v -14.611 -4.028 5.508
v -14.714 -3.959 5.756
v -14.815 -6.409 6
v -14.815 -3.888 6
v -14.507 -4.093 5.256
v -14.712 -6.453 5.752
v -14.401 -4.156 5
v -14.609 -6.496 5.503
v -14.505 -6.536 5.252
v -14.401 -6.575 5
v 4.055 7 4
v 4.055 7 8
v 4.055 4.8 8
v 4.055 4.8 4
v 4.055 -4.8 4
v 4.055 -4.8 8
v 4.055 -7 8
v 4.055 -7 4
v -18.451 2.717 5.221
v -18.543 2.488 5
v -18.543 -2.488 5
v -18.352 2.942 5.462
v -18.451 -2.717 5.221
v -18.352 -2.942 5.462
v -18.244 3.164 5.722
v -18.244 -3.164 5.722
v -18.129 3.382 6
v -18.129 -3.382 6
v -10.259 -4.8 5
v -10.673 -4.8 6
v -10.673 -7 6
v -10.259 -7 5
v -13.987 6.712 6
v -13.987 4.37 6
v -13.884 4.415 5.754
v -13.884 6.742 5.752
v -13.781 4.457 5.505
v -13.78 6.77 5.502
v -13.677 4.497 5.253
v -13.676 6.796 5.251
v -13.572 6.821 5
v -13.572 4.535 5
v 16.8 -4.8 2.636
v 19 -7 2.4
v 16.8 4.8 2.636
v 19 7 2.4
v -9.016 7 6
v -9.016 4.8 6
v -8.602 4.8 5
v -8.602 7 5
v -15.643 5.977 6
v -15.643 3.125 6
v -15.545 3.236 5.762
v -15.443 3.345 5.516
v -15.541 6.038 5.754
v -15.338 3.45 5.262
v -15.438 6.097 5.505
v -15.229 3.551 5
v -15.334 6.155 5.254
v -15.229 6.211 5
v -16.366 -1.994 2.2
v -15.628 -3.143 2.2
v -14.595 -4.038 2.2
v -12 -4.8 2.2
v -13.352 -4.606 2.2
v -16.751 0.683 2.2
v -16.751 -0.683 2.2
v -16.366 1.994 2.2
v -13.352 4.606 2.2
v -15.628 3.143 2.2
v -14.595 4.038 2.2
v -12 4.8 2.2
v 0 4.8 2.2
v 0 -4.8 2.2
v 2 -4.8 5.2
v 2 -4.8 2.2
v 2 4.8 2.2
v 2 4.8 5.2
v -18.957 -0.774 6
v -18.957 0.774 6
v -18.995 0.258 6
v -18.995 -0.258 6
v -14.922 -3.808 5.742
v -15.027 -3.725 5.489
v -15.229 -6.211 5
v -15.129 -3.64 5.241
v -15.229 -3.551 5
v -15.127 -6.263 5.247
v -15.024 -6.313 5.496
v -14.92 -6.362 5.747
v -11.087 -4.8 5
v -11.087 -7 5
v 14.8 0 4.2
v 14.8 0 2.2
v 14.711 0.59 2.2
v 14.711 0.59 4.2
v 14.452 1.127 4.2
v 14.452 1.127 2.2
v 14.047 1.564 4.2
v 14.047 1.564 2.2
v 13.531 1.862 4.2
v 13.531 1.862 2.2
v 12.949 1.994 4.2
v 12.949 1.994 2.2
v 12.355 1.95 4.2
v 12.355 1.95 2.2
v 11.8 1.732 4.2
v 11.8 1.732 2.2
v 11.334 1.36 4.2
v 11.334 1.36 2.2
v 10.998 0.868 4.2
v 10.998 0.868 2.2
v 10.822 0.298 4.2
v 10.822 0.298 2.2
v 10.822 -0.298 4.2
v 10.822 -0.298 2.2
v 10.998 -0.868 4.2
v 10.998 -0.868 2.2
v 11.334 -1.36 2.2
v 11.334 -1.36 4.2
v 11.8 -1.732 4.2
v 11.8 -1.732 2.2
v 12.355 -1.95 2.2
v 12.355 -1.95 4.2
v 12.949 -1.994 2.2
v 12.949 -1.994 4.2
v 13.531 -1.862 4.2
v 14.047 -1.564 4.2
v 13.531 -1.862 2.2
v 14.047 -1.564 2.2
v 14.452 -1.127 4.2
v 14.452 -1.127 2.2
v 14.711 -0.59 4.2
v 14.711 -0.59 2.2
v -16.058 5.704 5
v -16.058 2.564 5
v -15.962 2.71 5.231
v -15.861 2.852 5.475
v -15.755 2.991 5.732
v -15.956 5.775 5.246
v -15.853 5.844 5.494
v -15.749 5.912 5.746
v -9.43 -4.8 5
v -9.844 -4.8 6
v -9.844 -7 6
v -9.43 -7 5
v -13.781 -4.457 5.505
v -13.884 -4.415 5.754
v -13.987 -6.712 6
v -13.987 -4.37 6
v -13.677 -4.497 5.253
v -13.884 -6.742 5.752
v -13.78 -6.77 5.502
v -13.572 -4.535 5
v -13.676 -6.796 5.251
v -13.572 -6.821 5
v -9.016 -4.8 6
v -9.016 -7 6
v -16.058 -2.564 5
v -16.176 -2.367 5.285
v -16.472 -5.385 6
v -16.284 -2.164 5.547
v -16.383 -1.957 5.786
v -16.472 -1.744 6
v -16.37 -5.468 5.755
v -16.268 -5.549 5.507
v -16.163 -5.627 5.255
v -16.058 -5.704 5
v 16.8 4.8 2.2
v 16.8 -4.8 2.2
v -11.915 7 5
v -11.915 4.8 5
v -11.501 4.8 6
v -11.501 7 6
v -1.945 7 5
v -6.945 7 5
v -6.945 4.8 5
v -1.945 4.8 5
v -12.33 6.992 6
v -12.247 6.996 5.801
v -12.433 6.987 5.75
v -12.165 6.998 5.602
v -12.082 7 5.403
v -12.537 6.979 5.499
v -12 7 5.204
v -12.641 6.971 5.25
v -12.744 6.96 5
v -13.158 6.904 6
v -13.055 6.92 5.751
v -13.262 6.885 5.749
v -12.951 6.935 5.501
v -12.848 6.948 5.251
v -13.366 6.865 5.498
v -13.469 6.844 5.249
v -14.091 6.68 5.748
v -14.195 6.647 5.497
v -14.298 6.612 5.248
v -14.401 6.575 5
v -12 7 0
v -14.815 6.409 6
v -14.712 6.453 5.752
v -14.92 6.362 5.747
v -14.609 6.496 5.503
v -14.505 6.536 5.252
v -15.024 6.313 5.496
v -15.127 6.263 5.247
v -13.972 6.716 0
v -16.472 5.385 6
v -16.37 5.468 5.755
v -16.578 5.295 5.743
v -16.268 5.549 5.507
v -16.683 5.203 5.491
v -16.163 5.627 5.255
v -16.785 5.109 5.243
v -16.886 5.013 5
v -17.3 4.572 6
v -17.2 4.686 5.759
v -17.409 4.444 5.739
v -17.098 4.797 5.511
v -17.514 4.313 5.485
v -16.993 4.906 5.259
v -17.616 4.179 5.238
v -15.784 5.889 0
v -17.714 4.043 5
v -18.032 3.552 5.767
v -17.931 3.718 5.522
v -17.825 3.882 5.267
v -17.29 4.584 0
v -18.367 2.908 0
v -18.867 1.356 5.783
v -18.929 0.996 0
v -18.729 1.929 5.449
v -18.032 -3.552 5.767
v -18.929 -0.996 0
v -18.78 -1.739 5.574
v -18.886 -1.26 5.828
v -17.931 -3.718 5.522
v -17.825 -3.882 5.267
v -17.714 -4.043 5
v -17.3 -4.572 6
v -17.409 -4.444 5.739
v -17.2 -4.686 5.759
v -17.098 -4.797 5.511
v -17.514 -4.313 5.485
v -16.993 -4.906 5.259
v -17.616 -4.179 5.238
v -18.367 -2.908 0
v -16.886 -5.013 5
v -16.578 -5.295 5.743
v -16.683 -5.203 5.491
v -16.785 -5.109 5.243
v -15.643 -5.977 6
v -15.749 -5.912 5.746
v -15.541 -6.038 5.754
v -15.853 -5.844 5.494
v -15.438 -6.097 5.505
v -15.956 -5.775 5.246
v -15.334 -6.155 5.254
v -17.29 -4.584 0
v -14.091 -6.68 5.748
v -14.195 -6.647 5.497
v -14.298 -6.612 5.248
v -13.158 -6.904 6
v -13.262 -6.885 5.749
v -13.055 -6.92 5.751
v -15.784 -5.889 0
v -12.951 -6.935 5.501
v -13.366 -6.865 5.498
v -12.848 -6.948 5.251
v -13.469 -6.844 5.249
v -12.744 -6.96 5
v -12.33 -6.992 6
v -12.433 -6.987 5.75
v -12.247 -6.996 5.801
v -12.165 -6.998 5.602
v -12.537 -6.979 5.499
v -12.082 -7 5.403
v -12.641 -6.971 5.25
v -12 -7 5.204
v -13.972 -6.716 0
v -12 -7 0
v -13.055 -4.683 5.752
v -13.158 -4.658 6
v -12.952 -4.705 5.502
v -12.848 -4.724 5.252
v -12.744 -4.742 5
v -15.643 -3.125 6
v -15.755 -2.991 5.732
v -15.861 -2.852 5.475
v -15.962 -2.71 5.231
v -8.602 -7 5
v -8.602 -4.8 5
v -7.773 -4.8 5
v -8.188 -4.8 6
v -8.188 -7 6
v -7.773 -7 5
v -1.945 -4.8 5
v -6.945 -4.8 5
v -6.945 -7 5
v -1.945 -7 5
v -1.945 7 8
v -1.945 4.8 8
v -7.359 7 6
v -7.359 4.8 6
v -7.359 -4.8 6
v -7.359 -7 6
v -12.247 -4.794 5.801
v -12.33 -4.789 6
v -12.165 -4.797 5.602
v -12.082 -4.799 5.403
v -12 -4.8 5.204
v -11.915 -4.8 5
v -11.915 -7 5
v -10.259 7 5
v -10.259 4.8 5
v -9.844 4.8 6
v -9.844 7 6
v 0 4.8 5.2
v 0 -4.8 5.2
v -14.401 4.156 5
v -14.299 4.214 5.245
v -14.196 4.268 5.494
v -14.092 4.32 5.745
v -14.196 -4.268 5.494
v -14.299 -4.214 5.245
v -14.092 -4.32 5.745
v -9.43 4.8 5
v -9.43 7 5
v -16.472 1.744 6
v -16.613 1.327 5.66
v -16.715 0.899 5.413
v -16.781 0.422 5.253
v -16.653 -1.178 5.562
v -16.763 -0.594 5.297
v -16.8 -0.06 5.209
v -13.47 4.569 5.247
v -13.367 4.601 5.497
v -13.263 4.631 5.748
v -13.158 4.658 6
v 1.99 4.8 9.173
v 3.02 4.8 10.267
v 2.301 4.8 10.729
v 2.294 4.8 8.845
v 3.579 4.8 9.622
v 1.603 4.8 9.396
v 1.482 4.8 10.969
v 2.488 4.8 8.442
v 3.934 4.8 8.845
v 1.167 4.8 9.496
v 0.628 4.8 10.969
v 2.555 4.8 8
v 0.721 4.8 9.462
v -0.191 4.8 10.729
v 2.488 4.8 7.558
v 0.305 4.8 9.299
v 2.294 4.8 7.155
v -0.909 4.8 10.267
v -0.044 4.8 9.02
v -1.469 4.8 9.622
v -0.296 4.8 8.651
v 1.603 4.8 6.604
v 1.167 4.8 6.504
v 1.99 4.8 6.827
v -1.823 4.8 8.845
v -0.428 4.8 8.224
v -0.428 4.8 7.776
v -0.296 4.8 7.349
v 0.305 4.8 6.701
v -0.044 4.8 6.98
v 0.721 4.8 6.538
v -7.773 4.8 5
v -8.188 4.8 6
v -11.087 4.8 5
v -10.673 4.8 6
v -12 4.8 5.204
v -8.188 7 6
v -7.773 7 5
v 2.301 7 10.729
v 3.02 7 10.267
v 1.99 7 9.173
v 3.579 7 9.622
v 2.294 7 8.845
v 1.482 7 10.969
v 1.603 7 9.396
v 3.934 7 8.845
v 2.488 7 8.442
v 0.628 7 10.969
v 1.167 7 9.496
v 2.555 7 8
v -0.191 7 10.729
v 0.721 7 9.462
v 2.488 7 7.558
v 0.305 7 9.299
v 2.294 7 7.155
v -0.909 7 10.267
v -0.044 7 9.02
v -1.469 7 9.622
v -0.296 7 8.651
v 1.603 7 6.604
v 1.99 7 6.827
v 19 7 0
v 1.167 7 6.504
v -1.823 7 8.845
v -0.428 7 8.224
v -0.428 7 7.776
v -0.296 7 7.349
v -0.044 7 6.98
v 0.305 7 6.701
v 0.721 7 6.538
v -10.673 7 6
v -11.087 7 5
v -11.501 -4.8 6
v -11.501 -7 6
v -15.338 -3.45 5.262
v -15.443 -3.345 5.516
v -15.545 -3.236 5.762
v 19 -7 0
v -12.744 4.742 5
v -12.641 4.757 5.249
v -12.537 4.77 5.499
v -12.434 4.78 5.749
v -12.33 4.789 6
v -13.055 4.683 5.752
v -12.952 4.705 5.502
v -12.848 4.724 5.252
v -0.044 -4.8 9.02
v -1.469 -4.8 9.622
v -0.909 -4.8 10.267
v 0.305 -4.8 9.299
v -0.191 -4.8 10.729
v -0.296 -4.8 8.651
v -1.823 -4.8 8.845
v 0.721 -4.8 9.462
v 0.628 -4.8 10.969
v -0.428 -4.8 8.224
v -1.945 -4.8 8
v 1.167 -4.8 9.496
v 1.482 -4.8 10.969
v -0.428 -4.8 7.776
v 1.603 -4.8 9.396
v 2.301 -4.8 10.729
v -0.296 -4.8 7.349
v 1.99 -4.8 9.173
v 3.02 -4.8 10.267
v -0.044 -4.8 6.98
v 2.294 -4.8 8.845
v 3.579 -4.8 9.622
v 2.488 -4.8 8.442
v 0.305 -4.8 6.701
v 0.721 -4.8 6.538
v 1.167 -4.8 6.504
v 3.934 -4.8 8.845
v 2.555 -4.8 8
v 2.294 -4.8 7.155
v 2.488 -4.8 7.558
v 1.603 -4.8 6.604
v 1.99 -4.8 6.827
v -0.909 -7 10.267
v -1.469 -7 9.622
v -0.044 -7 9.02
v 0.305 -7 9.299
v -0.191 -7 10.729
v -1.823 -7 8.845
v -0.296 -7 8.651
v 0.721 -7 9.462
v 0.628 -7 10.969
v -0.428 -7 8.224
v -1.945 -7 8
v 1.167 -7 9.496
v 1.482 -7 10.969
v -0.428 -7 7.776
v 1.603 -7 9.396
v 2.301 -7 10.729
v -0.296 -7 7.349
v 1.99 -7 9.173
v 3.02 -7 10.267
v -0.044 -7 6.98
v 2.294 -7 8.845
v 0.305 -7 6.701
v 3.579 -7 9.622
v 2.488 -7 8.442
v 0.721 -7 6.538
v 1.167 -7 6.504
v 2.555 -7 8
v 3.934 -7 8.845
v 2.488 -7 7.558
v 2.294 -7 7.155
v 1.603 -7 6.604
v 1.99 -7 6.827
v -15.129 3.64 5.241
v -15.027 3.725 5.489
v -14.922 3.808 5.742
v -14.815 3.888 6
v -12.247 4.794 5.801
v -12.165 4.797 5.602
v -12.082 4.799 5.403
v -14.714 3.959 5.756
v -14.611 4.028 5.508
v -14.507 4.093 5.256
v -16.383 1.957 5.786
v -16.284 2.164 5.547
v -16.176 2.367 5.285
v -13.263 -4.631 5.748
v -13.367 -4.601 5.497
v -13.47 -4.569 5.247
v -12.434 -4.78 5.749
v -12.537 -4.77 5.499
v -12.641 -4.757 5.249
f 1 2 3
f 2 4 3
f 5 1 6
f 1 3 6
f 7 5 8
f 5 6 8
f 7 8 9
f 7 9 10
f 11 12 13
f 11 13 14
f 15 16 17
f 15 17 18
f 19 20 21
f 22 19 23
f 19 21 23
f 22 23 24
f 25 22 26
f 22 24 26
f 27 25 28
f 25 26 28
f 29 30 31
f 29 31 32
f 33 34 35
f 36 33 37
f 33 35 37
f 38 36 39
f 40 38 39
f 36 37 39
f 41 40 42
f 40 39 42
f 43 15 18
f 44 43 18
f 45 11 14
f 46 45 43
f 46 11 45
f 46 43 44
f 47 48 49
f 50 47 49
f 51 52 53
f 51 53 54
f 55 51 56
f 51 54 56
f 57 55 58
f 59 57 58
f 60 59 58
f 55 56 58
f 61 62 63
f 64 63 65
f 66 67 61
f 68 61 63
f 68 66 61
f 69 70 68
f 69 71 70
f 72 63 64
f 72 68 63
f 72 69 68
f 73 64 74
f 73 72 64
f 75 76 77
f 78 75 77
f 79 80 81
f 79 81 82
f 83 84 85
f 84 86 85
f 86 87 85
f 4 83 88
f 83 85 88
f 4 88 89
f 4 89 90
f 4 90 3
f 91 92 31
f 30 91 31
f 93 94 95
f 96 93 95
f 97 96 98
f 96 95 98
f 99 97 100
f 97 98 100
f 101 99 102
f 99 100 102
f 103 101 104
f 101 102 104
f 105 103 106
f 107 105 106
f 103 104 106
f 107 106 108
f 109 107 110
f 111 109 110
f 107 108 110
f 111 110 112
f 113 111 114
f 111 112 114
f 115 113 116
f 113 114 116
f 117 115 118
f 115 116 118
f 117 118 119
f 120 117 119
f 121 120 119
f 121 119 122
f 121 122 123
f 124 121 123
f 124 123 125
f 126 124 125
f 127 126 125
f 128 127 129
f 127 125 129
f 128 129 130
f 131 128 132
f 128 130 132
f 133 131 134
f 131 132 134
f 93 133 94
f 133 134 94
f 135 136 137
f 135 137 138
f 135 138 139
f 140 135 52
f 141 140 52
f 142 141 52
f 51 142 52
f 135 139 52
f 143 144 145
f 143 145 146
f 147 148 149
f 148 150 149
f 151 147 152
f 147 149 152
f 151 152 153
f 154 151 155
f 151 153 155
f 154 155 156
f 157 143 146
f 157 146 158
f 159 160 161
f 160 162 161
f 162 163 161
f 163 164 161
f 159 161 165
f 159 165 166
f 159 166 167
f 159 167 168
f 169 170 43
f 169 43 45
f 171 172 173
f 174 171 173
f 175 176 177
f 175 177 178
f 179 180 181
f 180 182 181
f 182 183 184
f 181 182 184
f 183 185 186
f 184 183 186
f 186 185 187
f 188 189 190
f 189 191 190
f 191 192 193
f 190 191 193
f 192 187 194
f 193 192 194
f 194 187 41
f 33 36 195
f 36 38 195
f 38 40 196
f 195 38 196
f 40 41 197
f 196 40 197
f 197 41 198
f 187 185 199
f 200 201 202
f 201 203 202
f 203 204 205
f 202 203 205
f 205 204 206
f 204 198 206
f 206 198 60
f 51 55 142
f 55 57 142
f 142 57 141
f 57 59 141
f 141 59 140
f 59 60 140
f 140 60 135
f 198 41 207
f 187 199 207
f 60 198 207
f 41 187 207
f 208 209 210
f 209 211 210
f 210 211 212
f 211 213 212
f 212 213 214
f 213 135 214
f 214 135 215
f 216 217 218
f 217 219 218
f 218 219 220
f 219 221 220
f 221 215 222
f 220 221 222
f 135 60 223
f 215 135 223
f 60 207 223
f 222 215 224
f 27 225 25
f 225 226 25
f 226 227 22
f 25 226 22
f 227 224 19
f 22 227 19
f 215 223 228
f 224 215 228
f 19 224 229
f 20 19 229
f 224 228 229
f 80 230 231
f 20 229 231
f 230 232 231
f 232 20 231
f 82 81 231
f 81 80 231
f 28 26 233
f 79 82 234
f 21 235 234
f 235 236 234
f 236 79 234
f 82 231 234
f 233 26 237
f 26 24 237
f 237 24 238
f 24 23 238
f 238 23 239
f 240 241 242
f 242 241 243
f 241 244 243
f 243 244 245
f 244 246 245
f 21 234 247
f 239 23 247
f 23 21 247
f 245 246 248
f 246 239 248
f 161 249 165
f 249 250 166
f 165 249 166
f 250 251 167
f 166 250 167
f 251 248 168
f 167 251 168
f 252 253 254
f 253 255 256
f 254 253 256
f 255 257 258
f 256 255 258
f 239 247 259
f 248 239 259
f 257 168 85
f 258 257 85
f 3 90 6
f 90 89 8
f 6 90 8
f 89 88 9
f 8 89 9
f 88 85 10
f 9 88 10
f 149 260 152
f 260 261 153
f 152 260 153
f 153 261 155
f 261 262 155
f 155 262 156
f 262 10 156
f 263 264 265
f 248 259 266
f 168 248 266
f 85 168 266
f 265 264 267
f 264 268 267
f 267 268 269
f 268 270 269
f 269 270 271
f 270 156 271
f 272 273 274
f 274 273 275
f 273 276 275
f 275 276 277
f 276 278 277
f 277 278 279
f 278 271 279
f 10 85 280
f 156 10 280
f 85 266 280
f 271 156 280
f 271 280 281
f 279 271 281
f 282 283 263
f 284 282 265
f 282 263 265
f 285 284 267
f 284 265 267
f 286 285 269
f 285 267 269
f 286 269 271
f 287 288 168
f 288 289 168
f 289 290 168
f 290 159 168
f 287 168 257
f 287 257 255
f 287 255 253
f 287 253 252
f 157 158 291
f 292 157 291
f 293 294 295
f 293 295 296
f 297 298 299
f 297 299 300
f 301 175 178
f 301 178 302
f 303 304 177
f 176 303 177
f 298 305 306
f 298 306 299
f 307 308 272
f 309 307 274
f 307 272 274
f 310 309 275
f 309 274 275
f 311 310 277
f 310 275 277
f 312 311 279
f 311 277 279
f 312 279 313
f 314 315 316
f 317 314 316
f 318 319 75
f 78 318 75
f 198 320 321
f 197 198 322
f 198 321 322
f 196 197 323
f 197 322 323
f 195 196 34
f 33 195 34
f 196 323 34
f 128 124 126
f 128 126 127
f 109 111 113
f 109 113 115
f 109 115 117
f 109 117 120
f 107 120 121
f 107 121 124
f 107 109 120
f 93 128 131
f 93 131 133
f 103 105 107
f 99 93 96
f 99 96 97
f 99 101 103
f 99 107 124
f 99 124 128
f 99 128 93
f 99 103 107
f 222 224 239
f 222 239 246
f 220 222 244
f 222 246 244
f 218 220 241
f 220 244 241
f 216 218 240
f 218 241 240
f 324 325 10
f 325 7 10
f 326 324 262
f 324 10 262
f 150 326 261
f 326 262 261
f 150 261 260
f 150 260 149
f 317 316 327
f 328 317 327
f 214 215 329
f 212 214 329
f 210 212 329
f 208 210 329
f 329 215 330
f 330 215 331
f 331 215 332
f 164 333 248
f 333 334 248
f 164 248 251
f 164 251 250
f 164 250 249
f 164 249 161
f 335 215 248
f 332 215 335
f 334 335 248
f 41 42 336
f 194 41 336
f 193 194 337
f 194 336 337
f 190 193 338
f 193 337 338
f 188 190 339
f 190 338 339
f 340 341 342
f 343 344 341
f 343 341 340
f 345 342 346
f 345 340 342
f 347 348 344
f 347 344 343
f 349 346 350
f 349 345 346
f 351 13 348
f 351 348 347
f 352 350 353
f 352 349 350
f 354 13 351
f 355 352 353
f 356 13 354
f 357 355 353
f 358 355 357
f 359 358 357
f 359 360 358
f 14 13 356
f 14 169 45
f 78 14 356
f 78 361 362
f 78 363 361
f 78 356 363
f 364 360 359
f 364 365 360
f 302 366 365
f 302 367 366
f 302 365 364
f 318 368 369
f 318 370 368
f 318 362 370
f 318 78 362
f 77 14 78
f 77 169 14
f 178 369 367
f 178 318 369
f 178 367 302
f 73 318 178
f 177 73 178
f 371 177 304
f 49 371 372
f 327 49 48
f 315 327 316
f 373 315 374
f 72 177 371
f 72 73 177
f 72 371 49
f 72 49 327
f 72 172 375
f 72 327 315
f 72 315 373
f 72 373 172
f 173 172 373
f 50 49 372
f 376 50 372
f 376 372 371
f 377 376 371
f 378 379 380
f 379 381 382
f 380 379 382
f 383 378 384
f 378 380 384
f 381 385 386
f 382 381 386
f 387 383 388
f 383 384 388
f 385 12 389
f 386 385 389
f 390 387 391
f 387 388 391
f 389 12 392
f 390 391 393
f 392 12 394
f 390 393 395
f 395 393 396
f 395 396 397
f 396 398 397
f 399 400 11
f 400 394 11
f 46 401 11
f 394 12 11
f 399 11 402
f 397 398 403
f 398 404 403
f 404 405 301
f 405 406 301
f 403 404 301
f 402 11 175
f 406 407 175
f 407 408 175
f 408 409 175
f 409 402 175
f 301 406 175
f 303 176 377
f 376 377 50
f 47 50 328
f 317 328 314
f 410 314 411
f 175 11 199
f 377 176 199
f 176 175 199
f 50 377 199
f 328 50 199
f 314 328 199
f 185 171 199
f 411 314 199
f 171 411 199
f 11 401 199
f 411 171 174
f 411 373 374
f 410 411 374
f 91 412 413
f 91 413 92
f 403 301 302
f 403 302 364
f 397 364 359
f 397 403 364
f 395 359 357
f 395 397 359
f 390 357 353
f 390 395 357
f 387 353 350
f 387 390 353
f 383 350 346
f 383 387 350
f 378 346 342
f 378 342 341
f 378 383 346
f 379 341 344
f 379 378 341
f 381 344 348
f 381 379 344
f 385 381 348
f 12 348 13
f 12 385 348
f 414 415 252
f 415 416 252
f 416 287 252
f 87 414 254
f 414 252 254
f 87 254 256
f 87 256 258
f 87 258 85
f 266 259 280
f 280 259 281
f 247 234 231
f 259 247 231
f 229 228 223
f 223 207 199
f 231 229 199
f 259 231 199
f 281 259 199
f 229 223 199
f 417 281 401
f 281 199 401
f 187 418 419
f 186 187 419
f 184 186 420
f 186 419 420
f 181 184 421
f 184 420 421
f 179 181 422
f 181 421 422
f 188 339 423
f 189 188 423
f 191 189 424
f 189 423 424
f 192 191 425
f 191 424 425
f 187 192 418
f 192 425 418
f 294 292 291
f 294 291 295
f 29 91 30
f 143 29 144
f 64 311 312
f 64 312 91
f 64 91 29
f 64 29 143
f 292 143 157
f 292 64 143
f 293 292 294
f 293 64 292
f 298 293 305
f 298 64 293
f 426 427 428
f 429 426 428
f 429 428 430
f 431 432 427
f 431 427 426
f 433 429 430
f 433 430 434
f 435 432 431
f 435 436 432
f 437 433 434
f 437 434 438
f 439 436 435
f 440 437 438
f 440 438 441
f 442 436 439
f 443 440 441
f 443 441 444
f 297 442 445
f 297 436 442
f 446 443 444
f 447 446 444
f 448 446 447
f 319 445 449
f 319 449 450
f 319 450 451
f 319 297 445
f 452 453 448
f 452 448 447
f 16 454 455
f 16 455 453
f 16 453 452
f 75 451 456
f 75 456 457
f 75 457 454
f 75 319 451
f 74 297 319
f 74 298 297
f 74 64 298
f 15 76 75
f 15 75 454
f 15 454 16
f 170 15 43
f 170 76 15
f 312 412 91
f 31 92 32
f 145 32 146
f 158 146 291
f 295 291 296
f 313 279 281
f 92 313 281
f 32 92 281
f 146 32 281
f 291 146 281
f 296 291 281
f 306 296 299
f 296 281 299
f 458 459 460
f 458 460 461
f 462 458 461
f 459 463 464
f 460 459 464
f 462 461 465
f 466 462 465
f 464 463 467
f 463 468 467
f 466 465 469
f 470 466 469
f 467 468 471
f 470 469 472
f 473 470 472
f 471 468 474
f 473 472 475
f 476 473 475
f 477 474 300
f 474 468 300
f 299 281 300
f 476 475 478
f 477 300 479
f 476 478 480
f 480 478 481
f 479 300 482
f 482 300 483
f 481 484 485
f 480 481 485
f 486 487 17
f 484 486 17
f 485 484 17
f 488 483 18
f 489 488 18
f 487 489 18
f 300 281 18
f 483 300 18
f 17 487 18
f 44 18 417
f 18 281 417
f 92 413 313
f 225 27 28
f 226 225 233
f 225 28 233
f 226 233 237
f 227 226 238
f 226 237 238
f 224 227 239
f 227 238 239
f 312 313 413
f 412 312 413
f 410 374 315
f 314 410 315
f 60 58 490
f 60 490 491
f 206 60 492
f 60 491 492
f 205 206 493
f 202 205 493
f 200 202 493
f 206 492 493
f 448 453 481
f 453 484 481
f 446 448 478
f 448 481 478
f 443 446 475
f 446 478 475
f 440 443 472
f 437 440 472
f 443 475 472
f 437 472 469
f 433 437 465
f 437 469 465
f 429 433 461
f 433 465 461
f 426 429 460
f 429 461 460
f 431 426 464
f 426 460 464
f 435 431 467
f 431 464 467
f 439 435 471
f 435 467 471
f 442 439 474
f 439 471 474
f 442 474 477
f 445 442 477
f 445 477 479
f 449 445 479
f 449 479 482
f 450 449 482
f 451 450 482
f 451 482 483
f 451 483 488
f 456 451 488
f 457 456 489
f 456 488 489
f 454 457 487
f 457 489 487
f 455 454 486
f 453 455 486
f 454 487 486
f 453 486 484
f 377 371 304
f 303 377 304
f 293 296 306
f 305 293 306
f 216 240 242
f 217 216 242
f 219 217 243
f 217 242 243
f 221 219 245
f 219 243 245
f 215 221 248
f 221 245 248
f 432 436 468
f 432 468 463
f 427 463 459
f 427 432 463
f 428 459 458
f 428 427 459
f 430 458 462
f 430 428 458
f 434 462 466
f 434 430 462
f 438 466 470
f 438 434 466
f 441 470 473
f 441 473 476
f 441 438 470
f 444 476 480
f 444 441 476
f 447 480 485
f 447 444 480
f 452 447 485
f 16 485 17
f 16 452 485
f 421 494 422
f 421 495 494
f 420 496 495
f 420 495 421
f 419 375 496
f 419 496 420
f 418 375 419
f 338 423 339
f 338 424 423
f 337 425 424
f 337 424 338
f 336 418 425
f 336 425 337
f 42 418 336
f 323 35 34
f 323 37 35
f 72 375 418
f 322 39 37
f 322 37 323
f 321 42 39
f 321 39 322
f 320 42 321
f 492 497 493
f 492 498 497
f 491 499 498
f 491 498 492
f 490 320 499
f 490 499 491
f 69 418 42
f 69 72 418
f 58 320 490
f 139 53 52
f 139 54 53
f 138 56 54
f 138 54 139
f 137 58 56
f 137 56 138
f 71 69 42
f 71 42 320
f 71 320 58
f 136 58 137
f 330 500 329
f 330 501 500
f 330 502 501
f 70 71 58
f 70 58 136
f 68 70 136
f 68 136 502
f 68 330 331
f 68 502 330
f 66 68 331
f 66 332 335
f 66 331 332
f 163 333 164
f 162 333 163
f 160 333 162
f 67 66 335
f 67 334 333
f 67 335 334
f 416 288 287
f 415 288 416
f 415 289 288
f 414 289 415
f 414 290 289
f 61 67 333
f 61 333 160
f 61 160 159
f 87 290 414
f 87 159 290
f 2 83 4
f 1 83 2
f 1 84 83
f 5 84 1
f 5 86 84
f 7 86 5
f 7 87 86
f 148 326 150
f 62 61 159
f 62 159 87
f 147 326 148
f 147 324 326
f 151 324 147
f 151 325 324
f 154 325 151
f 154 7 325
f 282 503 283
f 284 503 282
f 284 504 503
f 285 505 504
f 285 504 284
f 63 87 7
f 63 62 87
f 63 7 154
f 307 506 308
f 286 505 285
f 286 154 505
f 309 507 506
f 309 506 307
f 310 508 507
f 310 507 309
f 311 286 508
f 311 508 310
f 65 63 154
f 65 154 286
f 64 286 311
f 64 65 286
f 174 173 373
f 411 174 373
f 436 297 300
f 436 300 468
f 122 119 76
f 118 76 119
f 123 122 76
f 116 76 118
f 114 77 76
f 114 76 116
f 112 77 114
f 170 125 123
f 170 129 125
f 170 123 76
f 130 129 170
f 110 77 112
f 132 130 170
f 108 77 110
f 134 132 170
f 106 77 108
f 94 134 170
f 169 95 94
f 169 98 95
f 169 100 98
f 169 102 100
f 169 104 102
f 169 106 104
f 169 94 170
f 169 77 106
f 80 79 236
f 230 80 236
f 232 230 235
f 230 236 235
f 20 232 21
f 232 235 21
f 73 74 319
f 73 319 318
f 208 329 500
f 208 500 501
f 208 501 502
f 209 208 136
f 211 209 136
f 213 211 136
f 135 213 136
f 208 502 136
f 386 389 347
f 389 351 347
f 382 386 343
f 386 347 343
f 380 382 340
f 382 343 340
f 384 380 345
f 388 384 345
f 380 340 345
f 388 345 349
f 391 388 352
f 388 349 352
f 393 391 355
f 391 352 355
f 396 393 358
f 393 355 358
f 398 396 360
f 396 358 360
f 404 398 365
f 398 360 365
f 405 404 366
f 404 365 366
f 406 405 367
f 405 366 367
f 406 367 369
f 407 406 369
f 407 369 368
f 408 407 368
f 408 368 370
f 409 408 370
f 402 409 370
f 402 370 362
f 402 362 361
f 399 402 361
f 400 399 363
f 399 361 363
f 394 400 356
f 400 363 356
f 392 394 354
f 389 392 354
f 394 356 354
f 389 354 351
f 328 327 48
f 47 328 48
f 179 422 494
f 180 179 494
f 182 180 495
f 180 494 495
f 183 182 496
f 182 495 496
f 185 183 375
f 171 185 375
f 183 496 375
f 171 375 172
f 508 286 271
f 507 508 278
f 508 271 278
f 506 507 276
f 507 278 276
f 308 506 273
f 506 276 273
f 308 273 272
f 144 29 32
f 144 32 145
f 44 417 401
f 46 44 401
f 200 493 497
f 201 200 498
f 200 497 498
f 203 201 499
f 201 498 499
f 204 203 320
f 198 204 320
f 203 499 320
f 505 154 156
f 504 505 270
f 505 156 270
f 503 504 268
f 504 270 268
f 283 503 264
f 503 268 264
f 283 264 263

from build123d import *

# Parameters (mm, degrees)
F1_DEPTH  = 25
F2_T      = -2.2
F3_R      = 1.5
F4_DEPTH  = 12.5
F5_R      = 2
F6_DEPTH  = 2
F7_W      = 2
F7_H      = 9.6
F8_DEPTH  = 3
F10_DEPTH = 14


with BuildPart() as f1:
    # F0 (on Top) → F1 (new body)
    with BuildSketch(Plane.XY):
        with BuildLine():
            Line((19, 7), (-12, 7))
            ThreePointArc((-12, 7), (-19, 0), (-12, -7))
            Line((-12, -7), (19, -7))
            Line((19, -7), (19, 7))
        make_face()
    extrude(amount=F1_DEPTH)

    # F2
    f2_openings = [f1.faces().sort_by_distance(p)[0] for p in [
        (0.717666, 0, 25),
    ]]
    offset(amount=F2_T, openings=f2_openings)

    # F3 (on Front) → F4 (cut, symmetric)
    with BuildSketch(Plane.XZ):
        with BuildLine():
            Line((4.05511, 8), (4.05511, 4))
            Line((4.05511, 4), (19, 2.4))
            Line((19, 2.4), (19, 25))
            Line((19, 25), (-19.30074, 25))
            Line((-19.30074, 25), (-19.30074, 6))
            Line((-19.30074, 6), (-6.94489, 6))
            Line((-6.94489, 6), (-6.94489, 5))
            Line((-6.94489, 5), (-1.94489, 5))
            Line((-1.94489, 5), (-1.94489, 8))
            ThreePointArc((-1.94489, 8), (1.05511, 11), (4.05511, 8))
        make_face()
        with Locations((1.05511, 8)):
            Circle(F3_R)
    extrude(amount=F4_DEPTH, both=True, mode=Mode.SUBTRACT)

    # F5 (on face) → F6 (join)
    with BuildSketch(Plane.XY.offset(2.2)):
        with Locations((12.8, 0)):
            Circle(F5_R)
    extrude(amount=F6_DEPTH)

    # F7 (on face) → F8 (join)
    with BuildSketch(Plane.XY.offset(2.2)):
        with Locations((1, 0)):
            Rectangle(F7_W, F7_H)
    extrude(amount=F8_DEPTH)

    # F9 (on face) → F10 (cut, through all)
    with BuildSketch(Plane.XZ.offset(7)):
        Polygon((-18.54287, 5), (-18.128656, 6), (-18.957083, 6), align=None)
        Polygon((-17.714443, 5), (-17.300229, 6), (-18.128656, 6), align=None)
        Polygon((-16.886015, 5), (-16.471802, 6), (-17.300229, 6), align=None)
        Polygon((-16.057588, 5), (-15.643375, 6), (-16.471802, 6), align=None)
        Polygon((-15.229161, 5), (-14.814948, 6), (-15.643375, 6), align=None)
        Polygon((-14.400734, 5), (-13.98652, 6), (-14.814948, 6), align=None)
        Polygon((-13.572307, 5), (-13.158093, 6), (-13.98652, 6), align=None)
        Polygon((-12.74388, 5), (-12.329666, 6), (-13.158093, 6), align=None)
        Polygon((-11.915453, 5), (-11.501239, 6), (-12.329666, 6), align=None)
        Polygon((-11.087026, 5), (-10.672812, 6), (-11.501239, 6), align=None)
        Polygon((-10.258598, 5), (-9.844385, 6), (-10.672812, 6), align=None)
        Polygon((-9.430171, 5), (-9.015958, 6), (-9.844385, 6), align=None)
        Polygon((-8.601744, 5), (-8.187531, 6), (-9.015958, 6), align=None)
        Polygon((-7.773317, 5), (-7.359103, 6), (-8.187531, 6), align=None)
        Polygon((-6.94489, 5), (-6.530676, 6), (-7.359103, 6), align=None)
    extrude(amount=-F10_DEPTH, mode=Mode.SUBTRACT)


solid = f1.part
